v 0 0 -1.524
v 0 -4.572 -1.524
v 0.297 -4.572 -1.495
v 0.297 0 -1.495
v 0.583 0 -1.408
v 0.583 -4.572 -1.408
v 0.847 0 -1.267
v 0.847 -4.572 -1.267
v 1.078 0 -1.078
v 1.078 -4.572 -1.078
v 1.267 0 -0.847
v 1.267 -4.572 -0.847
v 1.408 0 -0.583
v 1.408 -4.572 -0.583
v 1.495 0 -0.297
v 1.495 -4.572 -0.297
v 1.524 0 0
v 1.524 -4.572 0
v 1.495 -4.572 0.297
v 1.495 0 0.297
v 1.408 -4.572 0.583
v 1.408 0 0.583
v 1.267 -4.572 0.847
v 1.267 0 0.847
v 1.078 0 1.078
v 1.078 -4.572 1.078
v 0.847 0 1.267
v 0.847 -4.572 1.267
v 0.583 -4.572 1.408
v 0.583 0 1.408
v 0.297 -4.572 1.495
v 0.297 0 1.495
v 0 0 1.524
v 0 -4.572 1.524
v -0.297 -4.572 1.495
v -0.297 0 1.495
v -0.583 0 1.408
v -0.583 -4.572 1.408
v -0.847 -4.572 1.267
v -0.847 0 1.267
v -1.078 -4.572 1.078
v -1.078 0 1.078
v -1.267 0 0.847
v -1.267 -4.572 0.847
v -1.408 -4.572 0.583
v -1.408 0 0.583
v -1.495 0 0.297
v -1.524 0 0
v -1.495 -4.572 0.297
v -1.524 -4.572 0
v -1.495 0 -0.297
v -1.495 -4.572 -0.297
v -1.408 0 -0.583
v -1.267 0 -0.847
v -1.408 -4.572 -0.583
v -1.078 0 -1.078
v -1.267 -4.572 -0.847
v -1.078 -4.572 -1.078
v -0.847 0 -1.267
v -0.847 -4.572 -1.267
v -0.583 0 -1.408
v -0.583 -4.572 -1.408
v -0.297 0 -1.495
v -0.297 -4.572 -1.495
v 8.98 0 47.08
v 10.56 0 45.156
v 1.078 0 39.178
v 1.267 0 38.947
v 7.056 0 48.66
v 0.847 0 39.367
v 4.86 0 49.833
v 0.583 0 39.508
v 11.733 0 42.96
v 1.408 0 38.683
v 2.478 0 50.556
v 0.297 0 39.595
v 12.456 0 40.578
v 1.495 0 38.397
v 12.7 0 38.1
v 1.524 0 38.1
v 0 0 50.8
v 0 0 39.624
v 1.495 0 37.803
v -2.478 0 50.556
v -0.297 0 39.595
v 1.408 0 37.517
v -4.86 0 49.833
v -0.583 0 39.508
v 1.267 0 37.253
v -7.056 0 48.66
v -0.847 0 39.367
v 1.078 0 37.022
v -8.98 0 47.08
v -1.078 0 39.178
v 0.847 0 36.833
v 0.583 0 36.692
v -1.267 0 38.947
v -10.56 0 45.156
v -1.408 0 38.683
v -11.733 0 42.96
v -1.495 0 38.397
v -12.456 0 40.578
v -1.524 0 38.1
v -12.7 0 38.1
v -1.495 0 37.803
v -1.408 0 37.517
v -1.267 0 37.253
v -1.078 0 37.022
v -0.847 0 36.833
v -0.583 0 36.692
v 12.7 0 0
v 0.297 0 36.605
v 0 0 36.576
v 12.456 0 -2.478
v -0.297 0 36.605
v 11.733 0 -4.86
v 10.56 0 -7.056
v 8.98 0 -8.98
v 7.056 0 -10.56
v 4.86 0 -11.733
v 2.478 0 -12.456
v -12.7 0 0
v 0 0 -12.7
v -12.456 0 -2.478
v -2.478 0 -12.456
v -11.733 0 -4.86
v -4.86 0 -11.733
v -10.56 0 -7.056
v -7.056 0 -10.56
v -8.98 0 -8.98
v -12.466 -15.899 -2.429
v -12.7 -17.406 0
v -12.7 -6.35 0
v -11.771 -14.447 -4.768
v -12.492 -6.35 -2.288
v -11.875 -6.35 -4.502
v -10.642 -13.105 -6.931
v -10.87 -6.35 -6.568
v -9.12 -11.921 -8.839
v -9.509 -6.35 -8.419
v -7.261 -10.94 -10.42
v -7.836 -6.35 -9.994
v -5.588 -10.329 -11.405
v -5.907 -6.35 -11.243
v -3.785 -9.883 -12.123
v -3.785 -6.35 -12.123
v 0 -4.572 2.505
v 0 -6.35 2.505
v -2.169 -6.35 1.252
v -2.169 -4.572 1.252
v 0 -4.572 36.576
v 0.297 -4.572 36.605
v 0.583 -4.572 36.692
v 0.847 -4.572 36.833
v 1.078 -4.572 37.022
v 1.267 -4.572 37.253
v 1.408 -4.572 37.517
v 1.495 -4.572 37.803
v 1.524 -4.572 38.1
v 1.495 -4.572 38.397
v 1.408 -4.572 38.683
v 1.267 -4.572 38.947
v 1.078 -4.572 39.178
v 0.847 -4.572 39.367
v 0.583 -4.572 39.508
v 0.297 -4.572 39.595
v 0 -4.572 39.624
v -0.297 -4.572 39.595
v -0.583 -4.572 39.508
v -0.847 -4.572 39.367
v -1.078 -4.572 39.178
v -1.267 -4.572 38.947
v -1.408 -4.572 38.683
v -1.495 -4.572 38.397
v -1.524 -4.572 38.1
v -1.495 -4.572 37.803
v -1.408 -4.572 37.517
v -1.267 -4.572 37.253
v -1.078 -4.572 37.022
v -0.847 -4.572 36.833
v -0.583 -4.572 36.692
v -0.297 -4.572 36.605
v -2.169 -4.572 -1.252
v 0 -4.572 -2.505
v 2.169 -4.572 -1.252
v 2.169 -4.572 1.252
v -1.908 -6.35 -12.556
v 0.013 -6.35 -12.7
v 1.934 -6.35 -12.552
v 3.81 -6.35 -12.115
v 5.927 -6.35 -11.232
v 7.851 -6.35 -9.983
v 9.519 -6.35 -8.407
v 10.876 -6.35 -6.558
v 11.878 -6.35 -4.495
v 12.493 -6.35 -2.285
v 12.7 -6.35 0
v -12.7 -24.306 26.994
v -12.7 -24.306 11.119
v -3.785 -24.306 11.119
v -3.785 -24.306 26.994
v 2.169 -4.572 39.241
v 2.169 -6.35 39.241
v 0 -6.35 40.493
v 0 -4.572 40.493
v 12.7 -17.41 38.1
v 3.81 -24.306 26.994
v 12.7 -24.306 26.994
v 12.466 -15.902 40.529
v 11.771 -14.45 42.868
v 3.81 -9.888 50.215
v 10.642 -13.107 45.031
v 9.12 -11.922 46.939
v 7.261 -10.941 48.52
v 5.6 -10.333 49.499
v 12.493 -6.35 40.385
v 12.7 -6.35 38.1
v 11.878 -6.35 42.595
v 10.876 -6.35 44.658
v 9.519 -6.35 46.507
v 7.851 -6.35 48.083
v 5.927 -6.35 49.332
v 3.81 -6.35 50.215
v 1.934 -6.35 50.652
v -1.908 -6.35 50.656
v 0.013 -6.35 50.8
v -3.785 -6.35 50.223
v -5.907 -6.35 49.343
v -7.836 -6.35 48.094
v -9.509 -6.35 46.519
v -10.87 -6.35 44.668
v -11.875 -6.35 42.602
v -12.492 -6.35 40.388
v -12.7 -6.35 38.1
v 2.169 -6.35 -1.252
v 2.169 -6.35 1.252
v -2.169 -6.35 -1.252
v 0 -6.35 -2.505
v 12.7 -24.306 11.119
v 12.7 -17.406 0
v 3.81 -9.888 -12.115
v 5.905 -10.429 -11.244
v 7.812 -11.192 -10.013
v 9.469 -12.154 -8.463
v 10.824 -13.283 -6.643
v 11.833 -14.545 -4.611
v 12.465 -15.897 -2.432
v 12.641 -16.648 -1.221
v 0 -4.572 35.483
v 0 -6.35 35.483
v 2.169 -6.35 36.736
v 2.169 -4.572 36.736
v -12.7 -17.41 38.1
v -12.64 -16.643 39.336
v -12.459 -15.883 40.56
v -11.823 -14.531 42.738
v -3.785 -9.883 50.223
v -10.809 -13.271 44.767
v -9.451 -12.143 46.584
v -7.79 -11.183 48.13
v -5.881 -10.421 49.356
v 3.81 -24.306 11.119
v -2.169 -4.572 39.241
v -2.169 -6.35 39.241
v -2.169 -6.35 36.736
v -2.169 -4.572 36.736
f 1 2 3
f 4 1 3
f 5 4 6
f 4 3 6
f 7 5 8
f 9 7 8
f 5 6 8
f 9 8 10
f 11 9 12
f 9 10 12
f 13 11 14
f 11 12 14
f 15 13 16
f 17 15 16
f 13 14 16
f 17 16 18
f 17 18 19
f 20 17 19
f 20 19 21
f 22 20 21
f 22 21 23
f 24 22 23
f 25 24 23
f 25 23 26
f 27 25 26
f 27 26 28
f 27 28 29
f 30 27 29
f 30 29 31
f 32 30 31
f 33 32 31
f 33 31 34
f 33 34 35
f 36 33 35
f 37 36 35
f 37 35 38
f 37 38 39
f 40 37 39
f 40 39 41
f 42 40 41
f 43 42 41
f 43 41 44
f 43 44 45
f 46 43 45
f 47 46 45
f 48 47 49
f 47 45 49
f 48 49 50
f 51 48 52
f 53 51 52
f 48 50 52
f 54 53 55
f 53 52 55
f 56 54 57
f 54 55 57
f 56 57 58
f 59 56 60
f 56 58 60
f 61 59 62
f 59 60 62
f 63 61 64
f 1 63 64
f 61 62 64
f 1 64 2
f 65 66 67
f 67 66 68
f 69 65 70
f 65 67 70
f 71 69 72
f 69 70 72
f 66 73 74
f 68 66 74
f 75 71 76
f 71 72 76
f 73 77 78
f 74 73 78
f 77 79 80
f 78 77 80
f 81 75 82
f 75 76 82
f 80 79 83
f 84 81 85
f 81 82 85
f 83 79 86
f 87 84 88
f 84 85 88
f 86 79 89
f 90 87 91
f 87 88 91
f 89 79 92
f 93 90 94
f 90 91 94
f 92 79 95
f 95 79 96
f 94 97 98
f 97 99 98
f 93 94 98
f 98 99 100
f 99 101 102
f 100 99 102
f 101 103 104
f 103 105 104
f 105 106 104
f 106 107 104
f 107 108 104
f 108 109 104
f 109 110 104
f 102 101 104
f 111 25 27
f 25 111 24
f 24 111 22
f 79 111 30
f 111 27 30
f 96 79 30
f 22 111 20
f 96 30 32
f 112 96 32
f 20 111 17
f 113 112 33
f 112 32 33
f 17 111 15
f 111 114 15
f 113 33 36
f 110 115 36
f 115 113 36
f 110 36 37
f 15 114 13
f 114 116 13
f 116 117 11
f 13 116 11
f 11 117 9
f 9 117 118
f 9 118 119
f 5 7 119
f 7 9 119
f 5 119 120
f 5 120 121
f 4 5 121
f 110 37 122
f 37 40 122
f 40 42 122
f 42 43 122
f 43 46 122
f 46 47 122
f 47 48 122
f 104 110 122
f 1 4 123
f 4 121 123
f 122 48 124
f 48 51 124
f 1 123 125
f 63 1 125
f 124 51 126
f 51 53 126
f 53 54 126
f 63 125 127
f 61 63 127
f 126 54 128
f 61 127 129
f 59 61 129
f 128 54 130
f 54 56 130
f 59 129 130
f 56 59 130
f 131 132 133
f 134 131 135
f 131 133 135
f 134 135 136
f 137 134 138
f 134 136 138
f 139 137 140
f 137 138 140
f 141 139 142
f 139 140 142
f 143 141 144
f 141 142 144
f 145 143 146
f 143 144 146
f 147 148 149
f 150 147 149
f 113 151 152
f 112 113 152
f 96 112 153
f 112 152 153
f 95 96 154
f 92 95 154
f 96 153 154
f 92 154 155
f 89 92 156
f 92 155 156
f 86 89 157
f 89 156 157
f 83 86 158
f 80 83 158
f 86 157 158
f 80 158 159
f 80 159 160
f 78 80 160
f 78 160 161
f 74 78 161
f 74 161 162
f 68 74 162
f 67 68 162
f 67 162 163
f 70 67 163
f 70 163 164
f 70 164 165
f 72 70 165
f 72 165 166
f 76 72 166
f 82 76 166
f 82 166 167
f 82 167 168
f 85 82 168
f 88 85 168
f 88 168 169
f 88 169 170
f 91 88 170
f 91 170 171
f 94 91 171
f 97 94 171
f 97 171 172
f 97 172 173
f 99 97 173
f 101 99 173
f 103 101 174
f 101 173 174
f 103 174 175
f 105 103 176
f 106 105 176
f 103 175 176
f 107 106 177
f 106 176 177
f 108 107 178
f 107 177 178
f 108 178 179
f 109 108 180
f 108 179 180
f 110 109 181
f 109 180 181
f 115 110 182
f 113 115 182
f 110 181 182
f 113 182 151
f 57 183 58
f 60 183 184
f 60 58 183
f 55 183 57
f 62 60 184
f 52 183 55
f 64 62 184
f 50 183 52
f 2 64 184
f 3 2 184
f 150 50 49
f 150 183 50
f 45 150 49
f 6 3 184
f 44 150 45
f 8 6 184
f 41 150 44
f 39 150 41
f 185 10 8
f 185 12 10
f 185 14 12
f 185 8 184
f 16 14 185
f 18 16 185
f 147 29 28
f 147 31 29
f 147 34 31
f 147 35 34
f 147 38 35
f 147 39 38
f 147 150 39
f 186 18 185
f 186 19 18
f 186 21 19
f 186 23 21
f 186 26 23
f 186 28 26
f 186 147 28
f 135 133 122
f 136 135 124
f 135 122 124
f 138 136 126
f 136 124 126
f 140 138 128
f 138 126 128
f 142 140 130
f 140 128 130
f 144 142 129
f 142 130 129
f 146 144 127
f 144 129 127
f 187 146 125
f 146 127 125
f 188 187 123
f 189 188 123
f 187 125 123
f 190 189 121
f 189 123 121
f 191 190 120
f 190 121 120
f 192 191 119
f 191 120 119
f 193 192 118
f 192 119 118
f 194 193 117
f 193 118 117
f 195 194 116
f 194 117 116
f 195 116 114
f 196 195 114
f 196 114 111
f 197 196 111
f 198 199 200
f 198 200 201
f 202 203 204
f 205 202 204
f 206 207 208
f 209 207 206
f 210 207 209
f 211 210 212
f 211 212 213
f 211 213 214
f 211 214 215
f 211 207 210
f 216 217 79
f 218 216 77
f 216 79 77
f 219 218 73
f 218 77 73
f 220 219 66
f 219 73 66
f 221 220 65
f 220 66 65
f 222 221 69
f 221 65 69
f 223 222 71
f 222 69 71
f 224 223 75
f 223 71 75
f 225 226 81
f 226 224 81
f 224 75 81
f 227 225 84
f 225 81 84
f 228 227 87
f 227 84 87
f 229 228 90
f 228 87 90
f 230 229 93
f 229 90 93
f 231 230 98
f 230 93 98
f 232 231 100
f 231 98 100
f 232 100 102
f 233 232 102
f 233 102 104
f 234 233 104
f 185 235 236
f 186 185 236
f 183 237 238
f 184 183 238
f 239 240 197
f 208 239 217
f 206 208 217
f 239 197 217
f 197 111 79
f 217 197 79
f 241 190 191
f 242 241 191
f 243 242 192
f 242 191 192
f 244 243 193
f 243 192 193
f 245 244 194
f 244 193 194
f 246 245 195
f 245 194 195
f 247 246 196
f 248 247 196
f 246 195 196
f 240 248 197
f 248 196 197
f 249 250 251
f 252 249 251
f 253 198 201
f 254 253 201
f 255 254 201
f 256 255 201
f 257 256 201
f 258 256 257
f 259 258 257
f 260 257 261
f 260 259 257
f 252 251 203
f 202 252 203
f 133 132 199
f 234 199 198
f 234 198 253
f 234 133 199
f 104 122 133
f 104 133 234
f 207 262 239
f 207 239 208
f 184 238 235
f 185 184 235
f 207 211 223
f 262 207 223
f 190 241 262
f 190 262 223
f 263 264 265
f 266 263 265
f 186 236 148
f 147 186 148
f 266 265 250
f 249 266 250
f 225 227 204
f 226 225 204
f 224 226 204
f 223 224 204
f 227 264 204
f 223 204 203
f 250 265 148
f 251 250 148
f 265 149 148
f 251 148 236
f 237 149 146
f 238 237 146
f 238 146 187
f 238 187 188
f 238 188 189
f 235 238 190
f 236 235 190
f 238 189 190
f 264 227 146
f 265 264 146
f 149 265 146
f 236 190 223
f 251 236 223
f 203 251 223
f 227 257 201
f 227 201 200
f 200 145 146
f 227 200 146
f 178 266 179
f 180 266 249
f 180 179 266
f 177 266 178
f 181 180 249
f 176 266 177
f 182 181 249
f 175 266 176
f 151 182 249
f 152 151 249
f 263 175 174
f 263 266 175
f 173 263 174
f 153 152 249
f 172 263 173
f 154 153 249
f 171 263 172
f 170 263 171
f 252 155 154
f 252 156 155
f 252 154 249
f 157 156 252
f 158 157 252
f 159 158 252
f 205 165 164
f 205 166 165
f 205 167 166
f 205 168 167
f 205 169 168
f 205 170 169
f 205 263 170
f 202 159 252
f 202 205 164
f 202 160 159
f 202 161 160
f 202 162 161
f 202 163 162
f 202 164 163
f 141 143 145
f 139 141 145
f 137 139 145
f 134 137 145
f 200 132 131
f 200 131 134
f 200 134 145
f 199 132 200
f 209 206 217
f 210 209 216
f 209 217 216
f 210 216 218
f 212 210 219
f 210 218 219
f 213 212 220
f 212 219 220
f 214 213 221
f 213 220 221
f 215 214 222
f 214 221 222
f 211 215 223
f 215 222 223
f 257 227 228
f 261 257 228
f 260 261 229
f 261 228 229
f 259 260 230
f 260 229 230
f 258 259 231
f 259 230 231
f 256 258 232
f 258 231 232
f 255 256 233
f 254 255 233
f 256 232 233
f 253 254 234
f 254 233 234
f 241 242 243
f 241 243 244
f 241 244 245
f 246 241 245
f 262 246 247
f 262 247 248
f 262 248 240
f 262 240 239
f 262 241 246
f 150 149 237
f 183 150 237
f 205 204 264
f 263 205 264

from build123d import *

# Parameters (mm, degrees)
BOSS_EXTRUDE1_DEPTH      = 6.35
BOSS_EXTRUDE3_DEPTH      = 12.7
BOSS_EXTRUDE3_DEPTH_BACK = 12.7
CUT_EXTRUDE13_DEPTH      = 58.729461394
CUT_EXTRUDE13_DEPTH_BACK = 58.729461394
SKETCH11_W               = 7.59470995
SKETCH11_H               = 29.201393096
CUT_EXTRUDE19_DEPTH      = 56.356413171
CUT_EXTRUDE20_DEPTH      = 1.778
SKETCH17_R               = 1.524
CUT_EXTRUDE21_DEPTH      = 56.958411062


with BuildPart() as part:
    # Sketch1 → Boss-Extrude1 (new body)
    with BuildSketch(Plane(origin=(0, 0, 0), x_dir=(1, 0, 0), z_dir=(0, 1, 0))):
        with BuildLine():
            Line((12.7, 0), (12.7, -38.1))
            ThreePointArc((12.7, -38.1), (0, -50.8), (-12.7, -38.1))
            Line((-12.7, -38.1), (-12.7, 0))
            ThreePointArc((-12.7, 0), (0, 12.7), (12.7, 0))
        make_face()
    extrude(amount=-BOSS_EXTRUDE1_DEPTH)

    # Sketch2 → Boss-Extrude3 (add, two sides: drawn at the far end of the back side and taken through both)
    with BuildSketch(Plane(origin=(0, 0, 0), x_dir=(0, 0, -1), z_dir=(1, 0, 0)).offset(-BOSS_EXTRUDE3_DEPTH_BACK)):
        Polygon((-50.8, -6.35), (12.7, -6.35), (12.7, -9.525), (-11.11884122, -24.305569585), (-26.99384122, -24.305569585), (-50.8, -9.525), align=None)
    extrude(amount=BOSS_EXTRUDE3_DEPTH + BOSS_EXTRUDE3_DEPTH_BACK)

    # Sketch11 → Cut-Extrude13 (cut, two sides: drawn at the far end of the back side and taken through both)
    with BuildSketch(Plane.XY.offset(-CUT_EXTRUDE13_DEPTH_BACK)):
        with Locations((0.012645025, -20.950696548)):
            Rectangle(SKETCH11_W, SKETCH11_H)
    extrude(amount=CUT_EXTRUDE13_DEPTH + CUT_EXTRUDE13_DEPTH_BACK, mode=Mode.SUBTRACT)

    # Sketch10 → Cut-Extrude19 (cut, through all)
    with BuildSketch(Plane(origin=(0, -6.35, 0), x_dir=(1, 0, 0), z_dir=(0, 1, 0))):
        with BuildLine():
            ThreePointArc((0, 12.7), (8.980256121, 8.980256121), (12.7, 0))
            Line((12.7, 0), (12.7, 12.7))
            Line((12.7, 12.7), (0, 12.7))
        make_face()
        with BuildLine():
            Line((12.7, -50.8), (12.7, -38.1))
            ThreePointArc((12.7, -38.1), (8.980256121, -47.080256121), (0, -50.8))
            Line((0, -50.8), (12.7, -50.8))
        make_face()
        with BuildLine():
            ThreePointArc((-12.7, 0), (-8.980256121, 8.980256121), (0, 12.7))
            Line((0, 12.7), (-12.7, 12.7))
            Line((-12.7, 12.7), (-12.7, 0))
        make_face()
        with BuildLine():
            Line((-12.7, -50.8), (0, -50.8))
            ThreePointArc((0, -50.8), (-8.980256121, -47.080256121), (-12.7, -38.1))
            Line((-12.7, -38.1), (-12.7, -50.8))
        make_face()
    extrude(amount=-CUT_EXTRUDE19_DEPTH, mode=Mode.SUBTRACT)

    # Sketch16 → Cut-Extrude20 (cut)
    with BuildSketch(Plane.XZ.offset(6.35)):
        Polygon((0, 2.504895139), (-2.169302824, 1.252447569), (-2.169302824, -1.252447569), (0, -2.504895139), (2.169302824, -1.252447569), (2.169302824, 1.252447569), align=None)
        Polygon((0, 40.493188159), (-2.169302824, 39.24074059), (-2.169302824, 36.735845451), (0, 35.483397882), (2.169302824, 36.735845451), (2.169302824, 39.24074059), align=None)
    extrude(amount=-CUT_EXTRUDE20_DEPTH, mode=Mode.SUBTRACT)

    # Sketch17 → Cut-Extrude21 (cut, through all)
    with BuildSketch(Plane.XZ.offset(4.572)):
        with Locations(Location((0, 38.1, 0), (0, 0, 270))):
            Circle(SKETCH17_R)
        with Locations(Location((0, 0, 0), (0, 0, 270))):
            Circle(SKETCH17_R)
    extrude(amount=-CUT_EXTRUDE21_DEPTH, mode=Mode.SUBTRACT)


solid = part.part
